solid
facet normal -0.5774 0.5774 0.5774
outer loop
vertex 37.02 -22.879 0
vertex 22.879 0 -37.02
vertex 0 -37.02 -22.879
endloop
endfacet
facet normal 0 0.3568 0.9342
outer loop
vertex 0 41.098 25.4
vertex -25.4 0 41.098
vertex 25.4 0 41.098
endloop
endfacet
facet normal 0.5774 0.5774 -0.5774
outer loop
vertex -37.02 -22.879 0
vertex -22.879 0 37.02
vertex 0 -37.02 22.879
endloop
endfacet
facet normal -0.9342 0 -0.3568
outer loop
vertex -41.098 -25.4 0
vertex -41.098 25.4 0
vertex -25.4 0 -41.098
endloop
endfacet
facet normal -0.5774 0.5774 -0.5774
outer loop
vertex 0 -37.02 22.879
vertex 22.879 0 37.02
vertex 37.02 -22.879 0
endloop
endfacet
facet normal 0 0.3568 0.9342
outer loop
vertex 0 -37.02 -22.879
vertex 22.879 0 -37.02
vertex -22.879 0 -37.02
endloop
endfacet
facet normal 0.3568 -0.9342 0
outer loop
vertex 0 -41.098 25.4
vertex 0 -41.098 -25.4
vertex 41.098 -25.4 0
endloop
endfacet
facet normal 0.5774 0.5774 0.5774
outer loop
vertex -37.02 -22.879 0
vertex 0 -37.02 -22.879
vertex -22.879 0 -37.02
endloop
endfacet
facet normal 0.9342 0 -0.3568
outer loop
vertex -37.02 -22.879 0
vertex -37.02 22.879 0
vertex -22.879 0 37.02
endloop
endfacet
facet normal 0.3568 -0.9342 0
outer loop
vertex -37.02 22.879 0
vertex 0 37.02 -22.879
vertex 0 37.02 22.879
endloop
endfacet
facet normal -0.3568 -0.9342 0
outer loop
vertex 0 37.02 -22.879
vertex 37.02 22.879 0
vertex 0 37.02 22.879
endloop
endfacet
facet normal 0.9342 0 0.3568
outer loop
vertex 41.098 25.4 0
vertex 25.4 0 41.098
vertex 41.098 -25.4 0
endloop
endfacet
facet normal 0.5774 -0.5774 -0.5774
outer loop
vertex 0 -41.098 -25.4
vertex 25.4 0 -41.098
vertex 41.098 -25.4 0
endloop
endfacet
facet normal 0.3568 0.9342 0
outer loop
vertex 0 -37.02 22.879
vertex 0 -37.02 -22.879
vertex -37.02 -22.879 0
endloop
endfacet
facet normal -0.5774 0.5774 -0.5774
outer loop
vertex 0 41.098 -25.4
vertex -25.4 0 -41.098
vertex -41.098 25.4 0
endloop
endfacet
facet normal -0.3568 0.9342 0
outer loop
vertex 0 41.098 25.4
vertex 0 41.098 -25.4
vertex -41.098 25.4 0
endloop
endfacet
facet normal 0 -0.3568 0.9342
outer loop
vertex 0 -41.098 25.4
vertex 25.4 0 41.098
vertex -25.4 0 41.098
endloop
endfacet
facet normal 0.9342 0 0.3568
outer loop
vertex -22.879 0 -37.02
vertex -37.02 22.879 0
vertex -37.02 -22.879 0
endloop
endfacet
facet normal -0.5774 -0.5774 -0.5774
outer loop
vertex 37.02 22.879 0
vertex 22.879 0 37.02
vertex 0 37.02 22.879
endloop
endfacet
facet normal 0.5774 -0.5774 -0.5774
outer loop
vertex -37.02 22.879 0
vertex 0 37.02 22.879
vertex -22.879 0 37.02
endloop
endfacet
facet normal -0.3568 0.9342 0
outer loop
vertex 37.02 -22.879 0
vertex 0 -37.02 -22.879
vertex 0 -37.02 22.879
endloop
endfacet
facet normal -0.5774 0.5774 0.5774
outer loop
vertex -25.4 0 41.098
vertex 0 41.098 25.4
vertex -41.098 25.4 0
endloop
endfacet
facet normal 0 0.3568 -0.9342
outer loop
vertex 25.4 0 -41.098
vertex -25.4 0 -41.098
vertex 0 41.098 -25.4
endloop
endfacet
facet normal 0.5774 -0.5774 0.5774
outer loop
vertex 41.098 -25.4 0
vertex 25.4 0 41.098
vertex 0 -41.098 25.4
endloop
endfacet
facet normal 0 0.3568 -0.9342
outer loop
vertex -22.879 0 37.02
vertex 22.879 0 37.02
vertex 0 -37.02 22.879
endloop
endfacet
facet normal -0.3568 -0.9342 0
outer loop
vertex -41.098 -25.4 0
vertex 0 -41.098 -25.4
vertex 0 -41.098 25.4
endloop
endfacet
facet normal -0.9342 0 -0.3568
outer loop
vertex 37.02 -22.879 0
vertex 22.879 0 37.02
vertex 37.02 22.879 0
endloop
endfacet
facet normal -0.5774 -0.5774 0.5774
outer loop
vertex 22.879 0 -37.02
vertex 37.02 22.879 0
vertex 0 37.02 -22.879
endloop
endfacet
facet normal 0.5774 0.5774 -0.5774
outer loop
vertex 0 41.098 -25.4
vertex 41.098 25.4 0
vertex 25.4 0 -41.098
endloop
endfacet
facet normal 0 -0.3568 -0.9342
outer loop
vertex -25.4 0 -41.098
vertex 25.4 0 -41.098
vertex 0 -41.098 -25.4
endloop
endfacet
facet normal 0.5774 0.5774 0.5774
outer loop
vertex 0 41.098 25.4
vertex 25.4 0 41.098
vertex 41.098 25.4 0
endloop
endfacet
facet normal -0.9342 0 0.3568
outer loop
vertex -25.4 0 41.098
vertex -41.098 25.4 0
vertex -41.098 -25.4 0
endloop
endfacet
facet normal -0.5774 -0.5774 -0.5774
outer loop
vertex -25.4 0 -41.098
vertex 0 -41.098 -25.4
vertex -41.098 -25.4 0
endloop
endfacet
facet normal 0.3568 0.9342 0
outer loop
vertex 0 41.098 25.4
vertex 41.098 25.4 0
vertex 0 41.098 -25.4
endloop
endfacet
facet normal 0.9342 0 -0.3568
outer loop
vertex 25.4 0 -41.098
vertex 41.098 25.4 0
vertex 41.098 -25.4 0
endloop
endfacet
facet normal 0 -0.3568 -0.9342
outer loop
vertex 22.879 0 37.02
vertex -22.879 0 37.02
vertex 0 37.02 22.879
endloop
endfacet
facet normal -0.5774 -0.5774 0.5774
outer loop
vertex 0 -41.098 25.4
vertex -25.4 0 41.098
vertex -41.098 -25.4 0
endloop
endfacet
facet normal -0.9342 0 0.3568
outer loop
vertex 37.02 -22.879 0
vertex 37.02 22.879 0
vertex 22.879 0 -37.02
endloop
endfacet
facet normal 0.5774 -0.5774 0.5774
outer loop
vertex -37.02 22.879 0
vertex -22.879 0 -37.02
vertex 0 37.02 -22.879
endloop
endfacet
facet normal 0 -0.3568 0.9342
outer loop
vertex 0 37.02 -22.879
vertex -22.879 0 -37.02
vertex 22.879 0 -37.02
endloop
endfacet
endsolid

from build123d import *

# Parameters (mm, degrees)
THICKEN2_T2 = 3.81


with BuildPart() as body_1:
    # Sketch25 → Surface-Plane19: a flat surface bounded by the sketch
    with BuildSketch(Plane(origin=(22.166021105, -22.166021105, 22.166021105), x_dir=(0.4082482904638631, -0.40824829046386274, -0.8164965809277263), z_dir=(0.5773502691896261, -0.5773502691896257, 0.5773502691896256)), mode=Mode.PRIVATE) as surface_plane19_2_region:
        Polygon((-23.186921601, 17.960512242), (-3.960799066, -29.060719263), (27.147720667, 11.100207021), align=None)
    surface_plane19_2 = surface_plane19_2_region.sketch.faces()[0]
    # Sketch24 → Surface-Plane18: a flat surface bounded by the sketch
    with BuildSketch(Plane(origin=(-22.166021105, -22.166021105, 22.166021105), x_dir=(-0.4082482904638629, -0.40824829046386274, -0.8164965809277263), z_dir=(0.5773502691896261, 0.5773502691896258, -0.5773502691896255)), mode=Mode.PRIVATE) as surface_plane18_3_region:
        Polygon((-23.186921601, 17.960512242), (-3.960799066, -29.060719263), (27.147720667, 11.100207021), align=None)
    surface_plane18_3 = surface_plane18_3_region.sketch.faces()[0]
    # Sketch26 → Surface-Plane20: a flat surface bounded by the sketch
    with BuildSketch(Plane(origin=(35.865375543, 0, 13.699354438), x_dir=(0.35682208977309, 0, -0.9341723589627158), z_dir=(0.9341723589627158, 0, 0.35682208977309)), mode=Mode.PRIVATE) as surface_plane20_4_region:
        Polygon((-29.329393675, 0), (14.664696837, -25.4), (14.664696837, 25.4), align=None)
    surface_plane20_4 = surface_plane20_4_region.sketch.faces()[0]
    # Sketch23 → Surface-Plane17: a flat surface bounded by the sketch
    with BuildSketch(Plane(origin=(0, -13.699354438, 35.865375543), x_dir=(-1, 0, 0), z_dir=(0, 0.3568220897730898, -0.9341723589627158)), mode=Mode.PRIVATE) as surface_plane17_5_region:
        Polygon((-25.4, 14.664696837), (0, -29.329393675), (25.4, 14.664696837), align=None)
    surface_plane17_5 = surface_plane17_5_region.sketch.faces()[0]
    # Sketch22 → Surface-Plane16: a flat surface bounded by the sketch
    with BuildSketch(Plane(origin=(13.699354438, -35.865375543, 0), x_dir=(0.9341723589627157, 0.35682208977309016, 0), z_dir=(-0.35682208977309016, 0.9341723589627157, 0)), mode=Mode.PRIVATE) as surface_plane16_6_region:
        Polygon((-14.664696837, 25.4), (-14.664696837, -25.4), (29.329393675, 0), align=None)
    surface_plane16_6 = surface_plane16_6_region.sketch.faces()[0]
    # Sketch21 → Surface-Plane15: a flat surface bounded by the sketch
    with BuildSketch(Plane(origin=(-13.699354438, -35.865375543, 0), x_dir=(-0.9341723589627156, 0.3568220897730903, 0), z_dir=(-0.3568220897730903, -0.9341723589627156, 0)), mode=Mode.PRIVATE) as surface_plane15_7_region:
        Polygon((29.329393675, 0), (-14.664696837, 25.4), (-14.664696837, -25.4), align=None)
    surface_plane15_7 = surface_plane15_7_region.sketch.faces()[0]
    # Sketch20 → Surface-Plane14: a flat surface bounded by the sketch
    with BuildSketch(Plane(origin=(-22.166021105, -22.166021105, -22.166021105), x_dir=(-0.8164965809277259, 0.4082482904638632, 0.408248290463863), z_dir=(-0.577350269189626, -0.5773502691896258, -0.5773502691896256)), mode=Mode.PRIVATE) as surface_plane14_8_region:
        Polygon((3.960799066, 29.060719263), (-27.147720667, -11.100207021), (23.186921601, -17.960512242), align=None)
    surface_plane14_8 = surface_plane14_8_region.sketch.faces()[0]
    # Sketch19 → Surface-Plane13: a flat surface bounded by the sketch
    with BuildSketch(Plane(origin=(0, -13.699354438, -35.865375543), x_dir=(-1, 0, 0), z_dir=(0, -0.35682208977309054, -0.9341723589627156)), mode=Mode.PRIVATE) as surface_plane13_9_region:
        Polygon((25.4, 14.664696837), (-25.4, 14.664696837), (0, -29.329393675), align=None)
    surface_plane13_9 = surface_plane13_9_region.sketch.faces()[0]
    # Sketch18 → Surface-Plane12: a flat surface bounded by the sketch
    with BuildSketch(Plane(origin=(22.166021105, -22.166021105, -22.166021105), x_dir=(-0.408248290463863, 0.40824829046386296, -0.8164965809277261), z_dir=(0.5773502691896256, -0.5773502691896261, -0.5773502691896257)), mode=Mode.PRIVATE) as surface_plane12_10_region:
        Polygon((23.186921601, 17.960512242), (3.960799066, -29.060719263), (-27.147720667, 11.100207021), align=None)
    surface_plane12_10 = surface_plane12_10_region.sketch.faces()[0]
    # Sketch17 → Surface-Plane11: a flat surface bounded by the sketch
    with BuildSketch(Plane(origin=(35.865375543, 0, -13.699354438), x_dir=(-0.3568220897730899, 0, -0.9341723589627158), z_dir=(0.9341723589627157, 0, -0.3568220897730898)), mode=Mode.PRIVATE) as surface_plane11_11_region:
        Polygon((29.329393675, 0), (-14.664696837, 25.4), (-14.664696837, -25.4), align=None)
    surface_plane11_11 = surface_plane11_11_region.sketch.faces()[0]
    # Sketch16 → Surface-Plane10: a flat surface bounded by the sketch
    with BuildSketch(Plane(origin=(22.166021105, 22.166021105, -22.166021105), x_dir=(0.40824829046386296, 0.4082482904638628, 0.8164965809277261), z_dir=(-0.5773502691896261, -0.5773502691896257, 0.5773502691896256)), mode=Mode.PRIVATE) as surface_plane10_12_region:
        Polygon((-3.960799066, 29.060719263), (27.147720667, -11.100207021), (-23.186921601, -17.960512242), align=None)
    surface_plane10_12 = surface_plane10_12_region.sketch.faces()[0]
    # Sketch14 → Surface-Plane9: a flat surface bounded by the sketch
    with BuildSketch(Plane(origin=(0, 13.699354438, -35.865375543), x_dir=(1, 0, 0), z_dir=(0, -0.35682208977309054, 0.9341723589627156)), mode=Mode.PRIVATE) as surface_plane9_13_region:
        Polygon((0, 29.329393675), (-25.4, -14.664696837), (25.4, -14.664696837), align=None)
    surface_plane9_13 = surface_plane9_13_region.sketch.faces()[0]
    # Sketch13 → Surface-Plane8: a flat surface bounded by the sketch
    with BuildSketch(Plane(origin=(-35.865375543, 0, -13.699354438), x_dir=(-0.35682208977309016, 0, 0.9341723589627156), z_dir=(-0.9341723589627157, 0, -0.35682208977309016)), mode=Mode.PRIVATE) as surface_plane8_14_region:
        Polygon((14.664696837, -25.4), (-29.329393675, 0), (14.664696837, 25.4), align=None)
    surface_plane8_14 = surface_plane8_14_region.sketch.faces()[0]
    # Sketch12 → Surface-Plane7: a flat surface bounded by the sketch
    with BuildSketch(Plane(origin=(0, 13.699354438, 35.865375543), x_dir=(-1, 0, 0), z_dir=(0, -0.35682208977309043, -0.9341723589627156)), mode=Mode.PRIVATE) as surface_plane7_15_region:
        Polygon((0, 29.329393675), (25.4, -14.664696837), (-25.4, -14.664696837), align=None)
    surface_plane7_15 = surface_plane7_15_region.sketch.faces()[0]
    # Sketch11 → Surface-Plane6: a flat surface bounded by the sketch
    with BuildSketch(Plane(origin=(-35.865375543, 0, 13.699354438), x_dir=(0.3568220897730894, 0, 0.9341723589627159), z_dir=(-0.934172358962716, 0, 0.35682208977308943)), mode=Mode.PRIVATE) as surface_plane6_16_region:
        Polygon((-14.664696837, -25.4), (29.329393675, 0), (-14.664696837, 25.4), align=None)
    surface_plane6_16 = surface_plane6_16_region.sketch.faces()[0]
    # Sketch10 → Surface-Plane5: a flat surface bounded by the sketch
    with BuildSketch(Plane(origin=(-22.166021105, 22.166021105, 22.166021105), x_dir=(-0.8164965809277259, -0.4082482904638633, -0.4082482904638629), z_dir=(0.577350269189626, -0.577350269189626, -0.5773502691896255)), mode=Mode.PRIVATE) as surface_plane5_17_region:
        Polygon((3.960799066, -29.060719263), (23.186921601, 17.960512242), (-27.147720667, 11.100207021), align=None)
    surface_plane5_17 = surface_plane5_17_region.sketch.faces()[0]
    # Sketch9 → Surface-Plane4: a flat surface bounded by the sketch
    with BuildSketch(Plane(origin=(22.166021105, 22.166021105, 22.166021105), x_dir=(0.40824829046386296, 0.4082482904638628, -0.8164965809277261), z_dir=(0.5773502691896261, 0.5773502691896257, 0.5773502691896256)), mode=Mode.PRIVATE) as surface_plane4_18_region:
        Polygon((-3.960799066, 29.060719263), (-23.186921601, -17.960512242), (27.147720667, -11.100207021), align=None)
    surface_plane4_18 = surface_plane4_18_region.sketch.faces()[0]
    # Sketch8 → Surface-Plane3: a flat surface bounded by the sketch
    with BuildSketch(Plane(origin=(13.699354438, 35.865375543, 0), x_dir=(-0.9341723589627156, 0.35682208977309043, 0), z_dir=(-0.35682208977309043, -0.9341723589627156, 0)), mode=Mode.PRIVATE) as surface_plane3_19_region:
        Polygon((-29.329393675, 0), (14.664696837, -25.4), (14.664696837, 25.4), align=None)
    surface_plane3_19 = surface_plane3_19_region.sketch.faces()[0]
    # Sketch7 → Surface-Plane2: a flat surface bounded by the sketch
    with BuildSketch(Plane(origin=(-13.699354438, 35.865375543, 0), x_dir=(0.9341723589627156, 0.3568220897730905, 0), z_dir=(-0.3568220897730905, 0.9341723589627156, 0)), mode=Mode.PRIVATE) as surface_plane2_20_region:
        Polygon((14.664696837, 25.4), (14.664696837, -25.4), (-29.329393675, 0), align=None)
    surface_plane2_20 = surface_plane2_20_region.sketch.faces()[0]
    # Sketch5 → Surface-Plane1: a flat surface bounded by the sketch
    with BuildSketch(Plane(origin=(-22.166021105, 22.166021105, -22.166021105), x_dir=(0.408248290463863, -0.4082482904638628, -0.8164965809277261), z_dir=(0.5773502691896258, -0.5773502691896258, 0.5773502691896256)), mode=Mode.PRIVATE) as surface_plane1_21_region:
        Polygon((3.960799066, 29.060719263), (23.186921601, -17.960512242), (-27.147720667, -11.100207021), align=None)
    surface_plane1_21 = surface_plane1_21_region.sketch.faces()[0]
    # Surface-Knit1: the surfaces knitted into one
    surface_knit1_1 = Shell(Face.sew_faces(surface_plane19_2.faces() + surface_plane18_3.faces() + surface_plane20_4.faces() + surface_plane17_5.faces() + surface_plane16_6.faces() + surface_plane15_7.faces() + surface_plane14_8.faces() + surface_plane13_9.faces() + surface_plane12_10.faces() + surface_plane11_11.faces() + surface_plane10_12.faces() + surface_plane9_13.faces() + surface_plane8_14.faces() + surface_plane7_15.faces() + surface_plane6_16.faces() + surface_plane5_17.faces() + surface_plane4_18.faces() + surface_plane3_19.faces() + surface_plane2_20.faces() + surface_plane1_21.faces())[0])
    add(Solid.thicken(surface_knit1_1, -THICKEN2_T2))


solid = body_1.part
